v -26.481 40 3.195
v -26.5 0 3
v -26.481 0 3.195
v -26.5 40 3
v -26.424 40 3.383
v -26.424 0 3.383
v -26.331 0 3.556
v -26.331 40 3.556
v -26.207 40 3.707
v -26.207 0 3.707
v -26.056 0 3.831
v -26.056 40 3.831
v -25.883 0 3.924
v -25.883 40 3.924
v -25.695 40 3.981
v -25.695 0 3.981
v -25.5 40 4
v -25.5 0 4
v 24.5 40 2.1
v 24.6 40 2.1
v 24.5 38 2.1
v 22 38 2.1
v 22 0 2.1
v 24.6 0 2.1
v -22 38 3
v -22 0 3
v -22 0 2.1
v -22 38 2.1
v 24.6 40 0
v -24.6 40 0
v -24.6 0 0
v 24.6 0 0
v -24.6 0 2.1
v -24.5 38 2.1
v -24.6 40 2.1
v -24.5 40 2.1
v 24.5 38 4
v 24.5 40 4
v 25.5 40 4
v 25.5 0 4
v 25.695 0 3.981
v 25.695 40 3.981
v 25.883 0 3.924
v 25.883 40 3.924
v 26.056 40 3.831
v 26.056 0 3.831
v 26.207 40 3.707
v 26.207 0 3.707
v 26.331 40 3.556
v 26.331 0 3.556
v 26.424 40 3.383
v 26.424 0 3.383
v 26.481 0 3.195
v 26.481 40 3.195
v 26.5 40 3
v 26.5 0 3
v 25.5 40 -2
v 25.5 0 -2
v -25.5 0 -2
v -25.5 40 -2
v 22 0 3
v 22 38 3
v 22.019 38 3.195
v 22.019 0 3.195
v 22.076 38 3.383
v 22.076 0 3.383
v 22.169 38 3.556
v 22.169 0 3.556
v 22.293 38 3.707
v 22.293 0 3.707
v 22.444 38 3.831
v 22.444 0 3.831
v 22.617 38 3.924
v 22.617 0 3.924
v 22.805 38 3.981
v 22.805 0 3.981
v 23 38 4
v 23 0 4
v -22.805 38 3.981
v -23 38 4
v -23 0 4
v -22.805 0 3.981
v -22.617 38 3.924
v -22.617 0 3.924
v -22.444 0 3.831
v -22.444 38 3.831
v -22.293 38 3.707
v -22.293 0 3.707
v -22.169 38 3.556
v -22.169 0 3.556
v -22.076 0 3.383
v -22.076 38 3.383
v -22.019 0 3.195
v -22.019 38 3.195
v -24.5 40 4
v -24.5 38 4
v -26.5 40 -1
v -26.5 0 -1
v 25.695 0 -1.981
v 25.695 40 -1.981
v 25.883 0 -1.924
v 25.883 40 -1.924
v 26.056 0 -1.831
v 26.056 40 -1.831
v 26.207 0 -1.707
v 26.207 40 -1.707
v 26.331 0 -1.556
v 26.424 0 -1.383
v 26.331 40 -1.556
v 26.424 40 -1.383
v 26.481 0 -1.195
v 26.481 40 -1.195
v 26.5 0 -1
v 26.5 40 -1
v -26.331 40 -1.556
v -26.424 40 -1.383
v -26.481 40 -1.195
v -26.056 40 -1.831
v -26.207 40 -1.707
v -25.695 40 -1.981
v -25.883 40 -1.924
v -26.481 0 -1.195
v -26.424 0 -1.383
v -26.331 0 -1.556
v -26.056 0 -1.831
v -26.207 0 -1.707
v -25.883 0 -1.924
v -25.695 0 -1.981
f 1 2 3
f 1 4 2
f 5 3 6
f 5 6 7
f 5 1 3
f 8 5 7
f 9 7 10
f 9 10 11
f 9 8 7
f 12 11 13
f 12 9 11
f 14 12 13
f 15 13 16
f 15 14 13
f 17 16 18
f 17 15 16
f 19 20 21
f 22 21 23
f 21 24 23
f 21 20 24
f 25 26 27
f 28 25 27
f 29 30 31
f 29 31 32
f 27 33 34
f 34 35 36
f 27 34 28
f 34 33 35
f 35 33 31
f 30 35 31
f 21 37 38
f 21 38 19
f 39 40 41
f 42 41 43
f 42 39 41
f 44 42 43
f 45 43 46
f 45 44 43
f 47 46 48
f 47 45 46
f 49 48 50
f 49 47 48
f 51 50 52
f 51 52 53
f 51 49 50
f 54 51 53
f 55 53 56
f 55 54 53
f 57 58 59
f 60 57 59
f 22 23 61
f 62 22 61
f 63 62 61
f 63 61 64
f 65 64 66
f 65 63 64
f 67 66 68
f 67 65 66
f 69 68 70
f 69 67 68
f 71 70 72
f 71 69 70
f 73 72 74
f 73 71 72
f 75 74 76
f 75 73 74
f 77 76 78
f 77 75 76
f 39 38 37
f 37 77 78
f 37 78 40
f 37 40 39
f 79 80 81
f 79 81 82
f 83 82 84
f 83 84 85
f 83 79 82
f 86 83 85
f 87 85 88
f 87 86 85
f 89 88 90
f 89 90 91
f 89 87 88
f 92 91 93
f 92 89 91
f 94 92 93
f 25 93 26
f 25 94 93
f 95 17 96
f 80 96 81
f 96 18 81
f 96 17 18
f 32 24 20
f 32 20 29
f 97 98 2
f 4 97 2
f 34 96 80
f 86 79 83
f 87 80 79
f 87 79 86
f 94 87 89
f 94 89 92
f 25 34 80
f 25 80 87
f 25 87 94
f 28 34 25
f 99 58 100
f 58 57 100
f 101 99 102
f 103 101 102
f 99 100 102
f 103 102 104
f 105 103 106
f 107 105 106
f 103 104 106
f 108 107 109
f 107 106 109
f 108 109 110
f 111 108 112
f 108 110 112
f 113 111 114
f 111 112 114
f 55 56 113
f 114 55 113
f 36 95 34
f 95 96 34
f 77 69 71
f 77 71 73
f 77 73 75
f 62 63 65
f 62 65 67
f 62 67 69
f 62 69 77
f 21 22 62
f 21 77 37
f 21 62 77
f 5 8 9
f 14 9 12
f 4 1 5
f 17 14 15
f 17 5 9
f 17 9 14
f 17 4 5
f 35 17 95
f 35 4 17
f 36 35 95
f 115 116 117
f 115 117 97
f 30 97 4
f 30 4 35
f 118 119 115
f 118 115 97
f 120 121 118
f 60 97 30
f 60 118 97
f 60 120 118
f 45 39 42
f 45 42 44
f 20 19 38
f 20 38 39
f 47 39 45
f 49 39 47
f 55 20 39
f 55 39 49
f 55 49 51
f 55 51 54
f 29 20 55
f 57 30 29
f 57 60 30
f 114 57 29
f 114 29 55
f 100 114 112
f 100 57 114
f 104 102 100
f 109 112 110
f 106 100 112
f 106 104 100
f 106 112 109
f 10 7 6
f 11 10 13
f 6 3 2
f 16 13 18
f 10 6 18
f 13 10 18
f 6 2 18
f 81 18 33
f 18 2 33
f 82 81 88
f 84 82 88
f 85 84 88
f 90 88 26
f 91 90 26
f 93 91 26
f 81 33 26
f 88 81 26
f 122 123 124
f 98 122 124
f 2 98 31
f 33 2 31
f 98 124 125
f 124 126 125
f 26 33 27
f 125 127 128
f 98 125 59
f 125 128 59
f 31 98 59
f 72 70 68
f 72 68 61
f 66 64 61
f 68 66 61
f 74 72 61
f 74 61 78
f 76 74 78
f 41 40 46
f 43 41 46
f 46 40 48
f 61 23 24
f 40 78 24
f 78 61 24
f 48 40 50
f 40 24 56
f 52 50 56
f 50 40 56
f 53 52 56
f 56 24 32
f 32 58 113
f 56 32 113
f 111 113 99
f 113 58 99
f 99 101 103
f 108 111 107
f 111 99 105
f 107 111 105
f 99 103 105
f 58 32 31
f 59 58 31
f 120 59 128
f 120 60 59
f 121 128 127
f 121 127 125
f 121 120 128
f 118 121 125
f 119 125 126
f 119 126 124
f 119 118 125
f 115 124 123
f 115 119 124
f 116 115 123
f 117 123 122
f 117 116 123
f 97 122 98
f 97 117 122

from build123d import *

# Parameters (mm, degrees)
BOSS_EXTRUDE1_DEPTH = 40
FILLET1_R           = 1
SKETCH3_W           = 3.059746362
SKETCH3_H           = 2.82490347
CUT_EXTRUDE1_DEPTH  = 2
SKETCH2_W           = 2.5
SKETCH2_H           = 2
SKETCH2_H_2         = 2.1
CUT_EXTRUDE2_DEPTH  = 45
SKETCH6_W           = 0.1
SKETCH6_H           = 2.1
CUT_EXTRUDE3_DEPTH  = 40


with BuildPart() as part:
    # Sketch1 → Boss-Extrude1 (new body)
    with BuildSketch(Plane(origin=(0, 0, 0), x_dir=(1, 0, 0), z_dir=(0, 1, 0))):
        Polygon((26.5, 2), (-26.5, 2), (-26.5, -4), (-22, -4), (-22, -2), (-24.5, -2), (-24.5, 0), (24.5, 0), (24.5, -2), (22, -2), (22, -4), (26.5, -4), align=None)
    extrude(amount=BOSS_EXTRUDE1_DEPTH)

    # Fillet1
    fillet1_edges = [part.edges().sort_by_distance(p)[0] for p in [
        (22, 20, 4),
        (26.5, 20, 4),
        (26.5, 20, -2),
        (-26.5, 20, -2),
        (-26.5, 20, 4),
        (-22, 20, 4),
    ]]
    fillet(fillet1_edges, radius=FILLET1_R)

    # Sketch3 → Cut-Extrude1 (cut)
    with BuildSketch(Plane(origin=(0, 40, 0), x_dir=(1, 0, 0), z_dir=(0, 1, 0))):
        Polygon((-24.5, -4.82490347), (-21.440253638, -4.82490347), (-21.343886973, -2.1), (-24.5, -2.1), align=None)
        with Locations((22.970126819, -3.412451735)):
            Rectangle(SKETCH3_W, SKETCH3_H)
    extrude(amount=-CUT_EXTRUDE1_DEPTH, mode=Mode.SUBTRACT)

    # Sketch2 → Cut-Extrude2 (cut)
    with BuildSketch(Plane(origin=(0, 0, 0), x_dir=(1, 0, 0), z_dir=(0, 1, 0))):
        with Locations((23.25, -1)):
            Rectangle(SKETCH2_W, SKETCH2_H)
        with Locations((-23.25, -1.05)):
            Rectangle(SKETCH2_W, SKETCH2_H_2)
    cut_extrude2 = extrude(amount=CUT_EXTRUDE2_DEPTH, mode=Mode.SUBTRACT)

    # Mirror1: Cut-Extrude2 across plane
    add(cut_extrude2.mirror(Plane(origin=(0, 0, 0), x_dir=(0, 0, 1), z_dir=(1, 0, 0))), mode=Mode.SUBTRACT)

    # Sketch6 → Cut-Extrude3 (cut)
    with BuildSketch(Plane(origin=(0, 40, 0), x_dir=(1, 0, 0), z_dir=(0, 1, 0))):
        with Locations((-24.55, -1.05)):
            Rectangle(SKETCH6_W, SKETCH6_H)
        with Locations((24.55, -1.05)):
            Rectangle(SKETCH6_W, SKETCH6_H)
    extrude(amount=-CUT_EXTRUDE3_DEPTH, mode=Mode.SUBTRACT)


solid = part.part
